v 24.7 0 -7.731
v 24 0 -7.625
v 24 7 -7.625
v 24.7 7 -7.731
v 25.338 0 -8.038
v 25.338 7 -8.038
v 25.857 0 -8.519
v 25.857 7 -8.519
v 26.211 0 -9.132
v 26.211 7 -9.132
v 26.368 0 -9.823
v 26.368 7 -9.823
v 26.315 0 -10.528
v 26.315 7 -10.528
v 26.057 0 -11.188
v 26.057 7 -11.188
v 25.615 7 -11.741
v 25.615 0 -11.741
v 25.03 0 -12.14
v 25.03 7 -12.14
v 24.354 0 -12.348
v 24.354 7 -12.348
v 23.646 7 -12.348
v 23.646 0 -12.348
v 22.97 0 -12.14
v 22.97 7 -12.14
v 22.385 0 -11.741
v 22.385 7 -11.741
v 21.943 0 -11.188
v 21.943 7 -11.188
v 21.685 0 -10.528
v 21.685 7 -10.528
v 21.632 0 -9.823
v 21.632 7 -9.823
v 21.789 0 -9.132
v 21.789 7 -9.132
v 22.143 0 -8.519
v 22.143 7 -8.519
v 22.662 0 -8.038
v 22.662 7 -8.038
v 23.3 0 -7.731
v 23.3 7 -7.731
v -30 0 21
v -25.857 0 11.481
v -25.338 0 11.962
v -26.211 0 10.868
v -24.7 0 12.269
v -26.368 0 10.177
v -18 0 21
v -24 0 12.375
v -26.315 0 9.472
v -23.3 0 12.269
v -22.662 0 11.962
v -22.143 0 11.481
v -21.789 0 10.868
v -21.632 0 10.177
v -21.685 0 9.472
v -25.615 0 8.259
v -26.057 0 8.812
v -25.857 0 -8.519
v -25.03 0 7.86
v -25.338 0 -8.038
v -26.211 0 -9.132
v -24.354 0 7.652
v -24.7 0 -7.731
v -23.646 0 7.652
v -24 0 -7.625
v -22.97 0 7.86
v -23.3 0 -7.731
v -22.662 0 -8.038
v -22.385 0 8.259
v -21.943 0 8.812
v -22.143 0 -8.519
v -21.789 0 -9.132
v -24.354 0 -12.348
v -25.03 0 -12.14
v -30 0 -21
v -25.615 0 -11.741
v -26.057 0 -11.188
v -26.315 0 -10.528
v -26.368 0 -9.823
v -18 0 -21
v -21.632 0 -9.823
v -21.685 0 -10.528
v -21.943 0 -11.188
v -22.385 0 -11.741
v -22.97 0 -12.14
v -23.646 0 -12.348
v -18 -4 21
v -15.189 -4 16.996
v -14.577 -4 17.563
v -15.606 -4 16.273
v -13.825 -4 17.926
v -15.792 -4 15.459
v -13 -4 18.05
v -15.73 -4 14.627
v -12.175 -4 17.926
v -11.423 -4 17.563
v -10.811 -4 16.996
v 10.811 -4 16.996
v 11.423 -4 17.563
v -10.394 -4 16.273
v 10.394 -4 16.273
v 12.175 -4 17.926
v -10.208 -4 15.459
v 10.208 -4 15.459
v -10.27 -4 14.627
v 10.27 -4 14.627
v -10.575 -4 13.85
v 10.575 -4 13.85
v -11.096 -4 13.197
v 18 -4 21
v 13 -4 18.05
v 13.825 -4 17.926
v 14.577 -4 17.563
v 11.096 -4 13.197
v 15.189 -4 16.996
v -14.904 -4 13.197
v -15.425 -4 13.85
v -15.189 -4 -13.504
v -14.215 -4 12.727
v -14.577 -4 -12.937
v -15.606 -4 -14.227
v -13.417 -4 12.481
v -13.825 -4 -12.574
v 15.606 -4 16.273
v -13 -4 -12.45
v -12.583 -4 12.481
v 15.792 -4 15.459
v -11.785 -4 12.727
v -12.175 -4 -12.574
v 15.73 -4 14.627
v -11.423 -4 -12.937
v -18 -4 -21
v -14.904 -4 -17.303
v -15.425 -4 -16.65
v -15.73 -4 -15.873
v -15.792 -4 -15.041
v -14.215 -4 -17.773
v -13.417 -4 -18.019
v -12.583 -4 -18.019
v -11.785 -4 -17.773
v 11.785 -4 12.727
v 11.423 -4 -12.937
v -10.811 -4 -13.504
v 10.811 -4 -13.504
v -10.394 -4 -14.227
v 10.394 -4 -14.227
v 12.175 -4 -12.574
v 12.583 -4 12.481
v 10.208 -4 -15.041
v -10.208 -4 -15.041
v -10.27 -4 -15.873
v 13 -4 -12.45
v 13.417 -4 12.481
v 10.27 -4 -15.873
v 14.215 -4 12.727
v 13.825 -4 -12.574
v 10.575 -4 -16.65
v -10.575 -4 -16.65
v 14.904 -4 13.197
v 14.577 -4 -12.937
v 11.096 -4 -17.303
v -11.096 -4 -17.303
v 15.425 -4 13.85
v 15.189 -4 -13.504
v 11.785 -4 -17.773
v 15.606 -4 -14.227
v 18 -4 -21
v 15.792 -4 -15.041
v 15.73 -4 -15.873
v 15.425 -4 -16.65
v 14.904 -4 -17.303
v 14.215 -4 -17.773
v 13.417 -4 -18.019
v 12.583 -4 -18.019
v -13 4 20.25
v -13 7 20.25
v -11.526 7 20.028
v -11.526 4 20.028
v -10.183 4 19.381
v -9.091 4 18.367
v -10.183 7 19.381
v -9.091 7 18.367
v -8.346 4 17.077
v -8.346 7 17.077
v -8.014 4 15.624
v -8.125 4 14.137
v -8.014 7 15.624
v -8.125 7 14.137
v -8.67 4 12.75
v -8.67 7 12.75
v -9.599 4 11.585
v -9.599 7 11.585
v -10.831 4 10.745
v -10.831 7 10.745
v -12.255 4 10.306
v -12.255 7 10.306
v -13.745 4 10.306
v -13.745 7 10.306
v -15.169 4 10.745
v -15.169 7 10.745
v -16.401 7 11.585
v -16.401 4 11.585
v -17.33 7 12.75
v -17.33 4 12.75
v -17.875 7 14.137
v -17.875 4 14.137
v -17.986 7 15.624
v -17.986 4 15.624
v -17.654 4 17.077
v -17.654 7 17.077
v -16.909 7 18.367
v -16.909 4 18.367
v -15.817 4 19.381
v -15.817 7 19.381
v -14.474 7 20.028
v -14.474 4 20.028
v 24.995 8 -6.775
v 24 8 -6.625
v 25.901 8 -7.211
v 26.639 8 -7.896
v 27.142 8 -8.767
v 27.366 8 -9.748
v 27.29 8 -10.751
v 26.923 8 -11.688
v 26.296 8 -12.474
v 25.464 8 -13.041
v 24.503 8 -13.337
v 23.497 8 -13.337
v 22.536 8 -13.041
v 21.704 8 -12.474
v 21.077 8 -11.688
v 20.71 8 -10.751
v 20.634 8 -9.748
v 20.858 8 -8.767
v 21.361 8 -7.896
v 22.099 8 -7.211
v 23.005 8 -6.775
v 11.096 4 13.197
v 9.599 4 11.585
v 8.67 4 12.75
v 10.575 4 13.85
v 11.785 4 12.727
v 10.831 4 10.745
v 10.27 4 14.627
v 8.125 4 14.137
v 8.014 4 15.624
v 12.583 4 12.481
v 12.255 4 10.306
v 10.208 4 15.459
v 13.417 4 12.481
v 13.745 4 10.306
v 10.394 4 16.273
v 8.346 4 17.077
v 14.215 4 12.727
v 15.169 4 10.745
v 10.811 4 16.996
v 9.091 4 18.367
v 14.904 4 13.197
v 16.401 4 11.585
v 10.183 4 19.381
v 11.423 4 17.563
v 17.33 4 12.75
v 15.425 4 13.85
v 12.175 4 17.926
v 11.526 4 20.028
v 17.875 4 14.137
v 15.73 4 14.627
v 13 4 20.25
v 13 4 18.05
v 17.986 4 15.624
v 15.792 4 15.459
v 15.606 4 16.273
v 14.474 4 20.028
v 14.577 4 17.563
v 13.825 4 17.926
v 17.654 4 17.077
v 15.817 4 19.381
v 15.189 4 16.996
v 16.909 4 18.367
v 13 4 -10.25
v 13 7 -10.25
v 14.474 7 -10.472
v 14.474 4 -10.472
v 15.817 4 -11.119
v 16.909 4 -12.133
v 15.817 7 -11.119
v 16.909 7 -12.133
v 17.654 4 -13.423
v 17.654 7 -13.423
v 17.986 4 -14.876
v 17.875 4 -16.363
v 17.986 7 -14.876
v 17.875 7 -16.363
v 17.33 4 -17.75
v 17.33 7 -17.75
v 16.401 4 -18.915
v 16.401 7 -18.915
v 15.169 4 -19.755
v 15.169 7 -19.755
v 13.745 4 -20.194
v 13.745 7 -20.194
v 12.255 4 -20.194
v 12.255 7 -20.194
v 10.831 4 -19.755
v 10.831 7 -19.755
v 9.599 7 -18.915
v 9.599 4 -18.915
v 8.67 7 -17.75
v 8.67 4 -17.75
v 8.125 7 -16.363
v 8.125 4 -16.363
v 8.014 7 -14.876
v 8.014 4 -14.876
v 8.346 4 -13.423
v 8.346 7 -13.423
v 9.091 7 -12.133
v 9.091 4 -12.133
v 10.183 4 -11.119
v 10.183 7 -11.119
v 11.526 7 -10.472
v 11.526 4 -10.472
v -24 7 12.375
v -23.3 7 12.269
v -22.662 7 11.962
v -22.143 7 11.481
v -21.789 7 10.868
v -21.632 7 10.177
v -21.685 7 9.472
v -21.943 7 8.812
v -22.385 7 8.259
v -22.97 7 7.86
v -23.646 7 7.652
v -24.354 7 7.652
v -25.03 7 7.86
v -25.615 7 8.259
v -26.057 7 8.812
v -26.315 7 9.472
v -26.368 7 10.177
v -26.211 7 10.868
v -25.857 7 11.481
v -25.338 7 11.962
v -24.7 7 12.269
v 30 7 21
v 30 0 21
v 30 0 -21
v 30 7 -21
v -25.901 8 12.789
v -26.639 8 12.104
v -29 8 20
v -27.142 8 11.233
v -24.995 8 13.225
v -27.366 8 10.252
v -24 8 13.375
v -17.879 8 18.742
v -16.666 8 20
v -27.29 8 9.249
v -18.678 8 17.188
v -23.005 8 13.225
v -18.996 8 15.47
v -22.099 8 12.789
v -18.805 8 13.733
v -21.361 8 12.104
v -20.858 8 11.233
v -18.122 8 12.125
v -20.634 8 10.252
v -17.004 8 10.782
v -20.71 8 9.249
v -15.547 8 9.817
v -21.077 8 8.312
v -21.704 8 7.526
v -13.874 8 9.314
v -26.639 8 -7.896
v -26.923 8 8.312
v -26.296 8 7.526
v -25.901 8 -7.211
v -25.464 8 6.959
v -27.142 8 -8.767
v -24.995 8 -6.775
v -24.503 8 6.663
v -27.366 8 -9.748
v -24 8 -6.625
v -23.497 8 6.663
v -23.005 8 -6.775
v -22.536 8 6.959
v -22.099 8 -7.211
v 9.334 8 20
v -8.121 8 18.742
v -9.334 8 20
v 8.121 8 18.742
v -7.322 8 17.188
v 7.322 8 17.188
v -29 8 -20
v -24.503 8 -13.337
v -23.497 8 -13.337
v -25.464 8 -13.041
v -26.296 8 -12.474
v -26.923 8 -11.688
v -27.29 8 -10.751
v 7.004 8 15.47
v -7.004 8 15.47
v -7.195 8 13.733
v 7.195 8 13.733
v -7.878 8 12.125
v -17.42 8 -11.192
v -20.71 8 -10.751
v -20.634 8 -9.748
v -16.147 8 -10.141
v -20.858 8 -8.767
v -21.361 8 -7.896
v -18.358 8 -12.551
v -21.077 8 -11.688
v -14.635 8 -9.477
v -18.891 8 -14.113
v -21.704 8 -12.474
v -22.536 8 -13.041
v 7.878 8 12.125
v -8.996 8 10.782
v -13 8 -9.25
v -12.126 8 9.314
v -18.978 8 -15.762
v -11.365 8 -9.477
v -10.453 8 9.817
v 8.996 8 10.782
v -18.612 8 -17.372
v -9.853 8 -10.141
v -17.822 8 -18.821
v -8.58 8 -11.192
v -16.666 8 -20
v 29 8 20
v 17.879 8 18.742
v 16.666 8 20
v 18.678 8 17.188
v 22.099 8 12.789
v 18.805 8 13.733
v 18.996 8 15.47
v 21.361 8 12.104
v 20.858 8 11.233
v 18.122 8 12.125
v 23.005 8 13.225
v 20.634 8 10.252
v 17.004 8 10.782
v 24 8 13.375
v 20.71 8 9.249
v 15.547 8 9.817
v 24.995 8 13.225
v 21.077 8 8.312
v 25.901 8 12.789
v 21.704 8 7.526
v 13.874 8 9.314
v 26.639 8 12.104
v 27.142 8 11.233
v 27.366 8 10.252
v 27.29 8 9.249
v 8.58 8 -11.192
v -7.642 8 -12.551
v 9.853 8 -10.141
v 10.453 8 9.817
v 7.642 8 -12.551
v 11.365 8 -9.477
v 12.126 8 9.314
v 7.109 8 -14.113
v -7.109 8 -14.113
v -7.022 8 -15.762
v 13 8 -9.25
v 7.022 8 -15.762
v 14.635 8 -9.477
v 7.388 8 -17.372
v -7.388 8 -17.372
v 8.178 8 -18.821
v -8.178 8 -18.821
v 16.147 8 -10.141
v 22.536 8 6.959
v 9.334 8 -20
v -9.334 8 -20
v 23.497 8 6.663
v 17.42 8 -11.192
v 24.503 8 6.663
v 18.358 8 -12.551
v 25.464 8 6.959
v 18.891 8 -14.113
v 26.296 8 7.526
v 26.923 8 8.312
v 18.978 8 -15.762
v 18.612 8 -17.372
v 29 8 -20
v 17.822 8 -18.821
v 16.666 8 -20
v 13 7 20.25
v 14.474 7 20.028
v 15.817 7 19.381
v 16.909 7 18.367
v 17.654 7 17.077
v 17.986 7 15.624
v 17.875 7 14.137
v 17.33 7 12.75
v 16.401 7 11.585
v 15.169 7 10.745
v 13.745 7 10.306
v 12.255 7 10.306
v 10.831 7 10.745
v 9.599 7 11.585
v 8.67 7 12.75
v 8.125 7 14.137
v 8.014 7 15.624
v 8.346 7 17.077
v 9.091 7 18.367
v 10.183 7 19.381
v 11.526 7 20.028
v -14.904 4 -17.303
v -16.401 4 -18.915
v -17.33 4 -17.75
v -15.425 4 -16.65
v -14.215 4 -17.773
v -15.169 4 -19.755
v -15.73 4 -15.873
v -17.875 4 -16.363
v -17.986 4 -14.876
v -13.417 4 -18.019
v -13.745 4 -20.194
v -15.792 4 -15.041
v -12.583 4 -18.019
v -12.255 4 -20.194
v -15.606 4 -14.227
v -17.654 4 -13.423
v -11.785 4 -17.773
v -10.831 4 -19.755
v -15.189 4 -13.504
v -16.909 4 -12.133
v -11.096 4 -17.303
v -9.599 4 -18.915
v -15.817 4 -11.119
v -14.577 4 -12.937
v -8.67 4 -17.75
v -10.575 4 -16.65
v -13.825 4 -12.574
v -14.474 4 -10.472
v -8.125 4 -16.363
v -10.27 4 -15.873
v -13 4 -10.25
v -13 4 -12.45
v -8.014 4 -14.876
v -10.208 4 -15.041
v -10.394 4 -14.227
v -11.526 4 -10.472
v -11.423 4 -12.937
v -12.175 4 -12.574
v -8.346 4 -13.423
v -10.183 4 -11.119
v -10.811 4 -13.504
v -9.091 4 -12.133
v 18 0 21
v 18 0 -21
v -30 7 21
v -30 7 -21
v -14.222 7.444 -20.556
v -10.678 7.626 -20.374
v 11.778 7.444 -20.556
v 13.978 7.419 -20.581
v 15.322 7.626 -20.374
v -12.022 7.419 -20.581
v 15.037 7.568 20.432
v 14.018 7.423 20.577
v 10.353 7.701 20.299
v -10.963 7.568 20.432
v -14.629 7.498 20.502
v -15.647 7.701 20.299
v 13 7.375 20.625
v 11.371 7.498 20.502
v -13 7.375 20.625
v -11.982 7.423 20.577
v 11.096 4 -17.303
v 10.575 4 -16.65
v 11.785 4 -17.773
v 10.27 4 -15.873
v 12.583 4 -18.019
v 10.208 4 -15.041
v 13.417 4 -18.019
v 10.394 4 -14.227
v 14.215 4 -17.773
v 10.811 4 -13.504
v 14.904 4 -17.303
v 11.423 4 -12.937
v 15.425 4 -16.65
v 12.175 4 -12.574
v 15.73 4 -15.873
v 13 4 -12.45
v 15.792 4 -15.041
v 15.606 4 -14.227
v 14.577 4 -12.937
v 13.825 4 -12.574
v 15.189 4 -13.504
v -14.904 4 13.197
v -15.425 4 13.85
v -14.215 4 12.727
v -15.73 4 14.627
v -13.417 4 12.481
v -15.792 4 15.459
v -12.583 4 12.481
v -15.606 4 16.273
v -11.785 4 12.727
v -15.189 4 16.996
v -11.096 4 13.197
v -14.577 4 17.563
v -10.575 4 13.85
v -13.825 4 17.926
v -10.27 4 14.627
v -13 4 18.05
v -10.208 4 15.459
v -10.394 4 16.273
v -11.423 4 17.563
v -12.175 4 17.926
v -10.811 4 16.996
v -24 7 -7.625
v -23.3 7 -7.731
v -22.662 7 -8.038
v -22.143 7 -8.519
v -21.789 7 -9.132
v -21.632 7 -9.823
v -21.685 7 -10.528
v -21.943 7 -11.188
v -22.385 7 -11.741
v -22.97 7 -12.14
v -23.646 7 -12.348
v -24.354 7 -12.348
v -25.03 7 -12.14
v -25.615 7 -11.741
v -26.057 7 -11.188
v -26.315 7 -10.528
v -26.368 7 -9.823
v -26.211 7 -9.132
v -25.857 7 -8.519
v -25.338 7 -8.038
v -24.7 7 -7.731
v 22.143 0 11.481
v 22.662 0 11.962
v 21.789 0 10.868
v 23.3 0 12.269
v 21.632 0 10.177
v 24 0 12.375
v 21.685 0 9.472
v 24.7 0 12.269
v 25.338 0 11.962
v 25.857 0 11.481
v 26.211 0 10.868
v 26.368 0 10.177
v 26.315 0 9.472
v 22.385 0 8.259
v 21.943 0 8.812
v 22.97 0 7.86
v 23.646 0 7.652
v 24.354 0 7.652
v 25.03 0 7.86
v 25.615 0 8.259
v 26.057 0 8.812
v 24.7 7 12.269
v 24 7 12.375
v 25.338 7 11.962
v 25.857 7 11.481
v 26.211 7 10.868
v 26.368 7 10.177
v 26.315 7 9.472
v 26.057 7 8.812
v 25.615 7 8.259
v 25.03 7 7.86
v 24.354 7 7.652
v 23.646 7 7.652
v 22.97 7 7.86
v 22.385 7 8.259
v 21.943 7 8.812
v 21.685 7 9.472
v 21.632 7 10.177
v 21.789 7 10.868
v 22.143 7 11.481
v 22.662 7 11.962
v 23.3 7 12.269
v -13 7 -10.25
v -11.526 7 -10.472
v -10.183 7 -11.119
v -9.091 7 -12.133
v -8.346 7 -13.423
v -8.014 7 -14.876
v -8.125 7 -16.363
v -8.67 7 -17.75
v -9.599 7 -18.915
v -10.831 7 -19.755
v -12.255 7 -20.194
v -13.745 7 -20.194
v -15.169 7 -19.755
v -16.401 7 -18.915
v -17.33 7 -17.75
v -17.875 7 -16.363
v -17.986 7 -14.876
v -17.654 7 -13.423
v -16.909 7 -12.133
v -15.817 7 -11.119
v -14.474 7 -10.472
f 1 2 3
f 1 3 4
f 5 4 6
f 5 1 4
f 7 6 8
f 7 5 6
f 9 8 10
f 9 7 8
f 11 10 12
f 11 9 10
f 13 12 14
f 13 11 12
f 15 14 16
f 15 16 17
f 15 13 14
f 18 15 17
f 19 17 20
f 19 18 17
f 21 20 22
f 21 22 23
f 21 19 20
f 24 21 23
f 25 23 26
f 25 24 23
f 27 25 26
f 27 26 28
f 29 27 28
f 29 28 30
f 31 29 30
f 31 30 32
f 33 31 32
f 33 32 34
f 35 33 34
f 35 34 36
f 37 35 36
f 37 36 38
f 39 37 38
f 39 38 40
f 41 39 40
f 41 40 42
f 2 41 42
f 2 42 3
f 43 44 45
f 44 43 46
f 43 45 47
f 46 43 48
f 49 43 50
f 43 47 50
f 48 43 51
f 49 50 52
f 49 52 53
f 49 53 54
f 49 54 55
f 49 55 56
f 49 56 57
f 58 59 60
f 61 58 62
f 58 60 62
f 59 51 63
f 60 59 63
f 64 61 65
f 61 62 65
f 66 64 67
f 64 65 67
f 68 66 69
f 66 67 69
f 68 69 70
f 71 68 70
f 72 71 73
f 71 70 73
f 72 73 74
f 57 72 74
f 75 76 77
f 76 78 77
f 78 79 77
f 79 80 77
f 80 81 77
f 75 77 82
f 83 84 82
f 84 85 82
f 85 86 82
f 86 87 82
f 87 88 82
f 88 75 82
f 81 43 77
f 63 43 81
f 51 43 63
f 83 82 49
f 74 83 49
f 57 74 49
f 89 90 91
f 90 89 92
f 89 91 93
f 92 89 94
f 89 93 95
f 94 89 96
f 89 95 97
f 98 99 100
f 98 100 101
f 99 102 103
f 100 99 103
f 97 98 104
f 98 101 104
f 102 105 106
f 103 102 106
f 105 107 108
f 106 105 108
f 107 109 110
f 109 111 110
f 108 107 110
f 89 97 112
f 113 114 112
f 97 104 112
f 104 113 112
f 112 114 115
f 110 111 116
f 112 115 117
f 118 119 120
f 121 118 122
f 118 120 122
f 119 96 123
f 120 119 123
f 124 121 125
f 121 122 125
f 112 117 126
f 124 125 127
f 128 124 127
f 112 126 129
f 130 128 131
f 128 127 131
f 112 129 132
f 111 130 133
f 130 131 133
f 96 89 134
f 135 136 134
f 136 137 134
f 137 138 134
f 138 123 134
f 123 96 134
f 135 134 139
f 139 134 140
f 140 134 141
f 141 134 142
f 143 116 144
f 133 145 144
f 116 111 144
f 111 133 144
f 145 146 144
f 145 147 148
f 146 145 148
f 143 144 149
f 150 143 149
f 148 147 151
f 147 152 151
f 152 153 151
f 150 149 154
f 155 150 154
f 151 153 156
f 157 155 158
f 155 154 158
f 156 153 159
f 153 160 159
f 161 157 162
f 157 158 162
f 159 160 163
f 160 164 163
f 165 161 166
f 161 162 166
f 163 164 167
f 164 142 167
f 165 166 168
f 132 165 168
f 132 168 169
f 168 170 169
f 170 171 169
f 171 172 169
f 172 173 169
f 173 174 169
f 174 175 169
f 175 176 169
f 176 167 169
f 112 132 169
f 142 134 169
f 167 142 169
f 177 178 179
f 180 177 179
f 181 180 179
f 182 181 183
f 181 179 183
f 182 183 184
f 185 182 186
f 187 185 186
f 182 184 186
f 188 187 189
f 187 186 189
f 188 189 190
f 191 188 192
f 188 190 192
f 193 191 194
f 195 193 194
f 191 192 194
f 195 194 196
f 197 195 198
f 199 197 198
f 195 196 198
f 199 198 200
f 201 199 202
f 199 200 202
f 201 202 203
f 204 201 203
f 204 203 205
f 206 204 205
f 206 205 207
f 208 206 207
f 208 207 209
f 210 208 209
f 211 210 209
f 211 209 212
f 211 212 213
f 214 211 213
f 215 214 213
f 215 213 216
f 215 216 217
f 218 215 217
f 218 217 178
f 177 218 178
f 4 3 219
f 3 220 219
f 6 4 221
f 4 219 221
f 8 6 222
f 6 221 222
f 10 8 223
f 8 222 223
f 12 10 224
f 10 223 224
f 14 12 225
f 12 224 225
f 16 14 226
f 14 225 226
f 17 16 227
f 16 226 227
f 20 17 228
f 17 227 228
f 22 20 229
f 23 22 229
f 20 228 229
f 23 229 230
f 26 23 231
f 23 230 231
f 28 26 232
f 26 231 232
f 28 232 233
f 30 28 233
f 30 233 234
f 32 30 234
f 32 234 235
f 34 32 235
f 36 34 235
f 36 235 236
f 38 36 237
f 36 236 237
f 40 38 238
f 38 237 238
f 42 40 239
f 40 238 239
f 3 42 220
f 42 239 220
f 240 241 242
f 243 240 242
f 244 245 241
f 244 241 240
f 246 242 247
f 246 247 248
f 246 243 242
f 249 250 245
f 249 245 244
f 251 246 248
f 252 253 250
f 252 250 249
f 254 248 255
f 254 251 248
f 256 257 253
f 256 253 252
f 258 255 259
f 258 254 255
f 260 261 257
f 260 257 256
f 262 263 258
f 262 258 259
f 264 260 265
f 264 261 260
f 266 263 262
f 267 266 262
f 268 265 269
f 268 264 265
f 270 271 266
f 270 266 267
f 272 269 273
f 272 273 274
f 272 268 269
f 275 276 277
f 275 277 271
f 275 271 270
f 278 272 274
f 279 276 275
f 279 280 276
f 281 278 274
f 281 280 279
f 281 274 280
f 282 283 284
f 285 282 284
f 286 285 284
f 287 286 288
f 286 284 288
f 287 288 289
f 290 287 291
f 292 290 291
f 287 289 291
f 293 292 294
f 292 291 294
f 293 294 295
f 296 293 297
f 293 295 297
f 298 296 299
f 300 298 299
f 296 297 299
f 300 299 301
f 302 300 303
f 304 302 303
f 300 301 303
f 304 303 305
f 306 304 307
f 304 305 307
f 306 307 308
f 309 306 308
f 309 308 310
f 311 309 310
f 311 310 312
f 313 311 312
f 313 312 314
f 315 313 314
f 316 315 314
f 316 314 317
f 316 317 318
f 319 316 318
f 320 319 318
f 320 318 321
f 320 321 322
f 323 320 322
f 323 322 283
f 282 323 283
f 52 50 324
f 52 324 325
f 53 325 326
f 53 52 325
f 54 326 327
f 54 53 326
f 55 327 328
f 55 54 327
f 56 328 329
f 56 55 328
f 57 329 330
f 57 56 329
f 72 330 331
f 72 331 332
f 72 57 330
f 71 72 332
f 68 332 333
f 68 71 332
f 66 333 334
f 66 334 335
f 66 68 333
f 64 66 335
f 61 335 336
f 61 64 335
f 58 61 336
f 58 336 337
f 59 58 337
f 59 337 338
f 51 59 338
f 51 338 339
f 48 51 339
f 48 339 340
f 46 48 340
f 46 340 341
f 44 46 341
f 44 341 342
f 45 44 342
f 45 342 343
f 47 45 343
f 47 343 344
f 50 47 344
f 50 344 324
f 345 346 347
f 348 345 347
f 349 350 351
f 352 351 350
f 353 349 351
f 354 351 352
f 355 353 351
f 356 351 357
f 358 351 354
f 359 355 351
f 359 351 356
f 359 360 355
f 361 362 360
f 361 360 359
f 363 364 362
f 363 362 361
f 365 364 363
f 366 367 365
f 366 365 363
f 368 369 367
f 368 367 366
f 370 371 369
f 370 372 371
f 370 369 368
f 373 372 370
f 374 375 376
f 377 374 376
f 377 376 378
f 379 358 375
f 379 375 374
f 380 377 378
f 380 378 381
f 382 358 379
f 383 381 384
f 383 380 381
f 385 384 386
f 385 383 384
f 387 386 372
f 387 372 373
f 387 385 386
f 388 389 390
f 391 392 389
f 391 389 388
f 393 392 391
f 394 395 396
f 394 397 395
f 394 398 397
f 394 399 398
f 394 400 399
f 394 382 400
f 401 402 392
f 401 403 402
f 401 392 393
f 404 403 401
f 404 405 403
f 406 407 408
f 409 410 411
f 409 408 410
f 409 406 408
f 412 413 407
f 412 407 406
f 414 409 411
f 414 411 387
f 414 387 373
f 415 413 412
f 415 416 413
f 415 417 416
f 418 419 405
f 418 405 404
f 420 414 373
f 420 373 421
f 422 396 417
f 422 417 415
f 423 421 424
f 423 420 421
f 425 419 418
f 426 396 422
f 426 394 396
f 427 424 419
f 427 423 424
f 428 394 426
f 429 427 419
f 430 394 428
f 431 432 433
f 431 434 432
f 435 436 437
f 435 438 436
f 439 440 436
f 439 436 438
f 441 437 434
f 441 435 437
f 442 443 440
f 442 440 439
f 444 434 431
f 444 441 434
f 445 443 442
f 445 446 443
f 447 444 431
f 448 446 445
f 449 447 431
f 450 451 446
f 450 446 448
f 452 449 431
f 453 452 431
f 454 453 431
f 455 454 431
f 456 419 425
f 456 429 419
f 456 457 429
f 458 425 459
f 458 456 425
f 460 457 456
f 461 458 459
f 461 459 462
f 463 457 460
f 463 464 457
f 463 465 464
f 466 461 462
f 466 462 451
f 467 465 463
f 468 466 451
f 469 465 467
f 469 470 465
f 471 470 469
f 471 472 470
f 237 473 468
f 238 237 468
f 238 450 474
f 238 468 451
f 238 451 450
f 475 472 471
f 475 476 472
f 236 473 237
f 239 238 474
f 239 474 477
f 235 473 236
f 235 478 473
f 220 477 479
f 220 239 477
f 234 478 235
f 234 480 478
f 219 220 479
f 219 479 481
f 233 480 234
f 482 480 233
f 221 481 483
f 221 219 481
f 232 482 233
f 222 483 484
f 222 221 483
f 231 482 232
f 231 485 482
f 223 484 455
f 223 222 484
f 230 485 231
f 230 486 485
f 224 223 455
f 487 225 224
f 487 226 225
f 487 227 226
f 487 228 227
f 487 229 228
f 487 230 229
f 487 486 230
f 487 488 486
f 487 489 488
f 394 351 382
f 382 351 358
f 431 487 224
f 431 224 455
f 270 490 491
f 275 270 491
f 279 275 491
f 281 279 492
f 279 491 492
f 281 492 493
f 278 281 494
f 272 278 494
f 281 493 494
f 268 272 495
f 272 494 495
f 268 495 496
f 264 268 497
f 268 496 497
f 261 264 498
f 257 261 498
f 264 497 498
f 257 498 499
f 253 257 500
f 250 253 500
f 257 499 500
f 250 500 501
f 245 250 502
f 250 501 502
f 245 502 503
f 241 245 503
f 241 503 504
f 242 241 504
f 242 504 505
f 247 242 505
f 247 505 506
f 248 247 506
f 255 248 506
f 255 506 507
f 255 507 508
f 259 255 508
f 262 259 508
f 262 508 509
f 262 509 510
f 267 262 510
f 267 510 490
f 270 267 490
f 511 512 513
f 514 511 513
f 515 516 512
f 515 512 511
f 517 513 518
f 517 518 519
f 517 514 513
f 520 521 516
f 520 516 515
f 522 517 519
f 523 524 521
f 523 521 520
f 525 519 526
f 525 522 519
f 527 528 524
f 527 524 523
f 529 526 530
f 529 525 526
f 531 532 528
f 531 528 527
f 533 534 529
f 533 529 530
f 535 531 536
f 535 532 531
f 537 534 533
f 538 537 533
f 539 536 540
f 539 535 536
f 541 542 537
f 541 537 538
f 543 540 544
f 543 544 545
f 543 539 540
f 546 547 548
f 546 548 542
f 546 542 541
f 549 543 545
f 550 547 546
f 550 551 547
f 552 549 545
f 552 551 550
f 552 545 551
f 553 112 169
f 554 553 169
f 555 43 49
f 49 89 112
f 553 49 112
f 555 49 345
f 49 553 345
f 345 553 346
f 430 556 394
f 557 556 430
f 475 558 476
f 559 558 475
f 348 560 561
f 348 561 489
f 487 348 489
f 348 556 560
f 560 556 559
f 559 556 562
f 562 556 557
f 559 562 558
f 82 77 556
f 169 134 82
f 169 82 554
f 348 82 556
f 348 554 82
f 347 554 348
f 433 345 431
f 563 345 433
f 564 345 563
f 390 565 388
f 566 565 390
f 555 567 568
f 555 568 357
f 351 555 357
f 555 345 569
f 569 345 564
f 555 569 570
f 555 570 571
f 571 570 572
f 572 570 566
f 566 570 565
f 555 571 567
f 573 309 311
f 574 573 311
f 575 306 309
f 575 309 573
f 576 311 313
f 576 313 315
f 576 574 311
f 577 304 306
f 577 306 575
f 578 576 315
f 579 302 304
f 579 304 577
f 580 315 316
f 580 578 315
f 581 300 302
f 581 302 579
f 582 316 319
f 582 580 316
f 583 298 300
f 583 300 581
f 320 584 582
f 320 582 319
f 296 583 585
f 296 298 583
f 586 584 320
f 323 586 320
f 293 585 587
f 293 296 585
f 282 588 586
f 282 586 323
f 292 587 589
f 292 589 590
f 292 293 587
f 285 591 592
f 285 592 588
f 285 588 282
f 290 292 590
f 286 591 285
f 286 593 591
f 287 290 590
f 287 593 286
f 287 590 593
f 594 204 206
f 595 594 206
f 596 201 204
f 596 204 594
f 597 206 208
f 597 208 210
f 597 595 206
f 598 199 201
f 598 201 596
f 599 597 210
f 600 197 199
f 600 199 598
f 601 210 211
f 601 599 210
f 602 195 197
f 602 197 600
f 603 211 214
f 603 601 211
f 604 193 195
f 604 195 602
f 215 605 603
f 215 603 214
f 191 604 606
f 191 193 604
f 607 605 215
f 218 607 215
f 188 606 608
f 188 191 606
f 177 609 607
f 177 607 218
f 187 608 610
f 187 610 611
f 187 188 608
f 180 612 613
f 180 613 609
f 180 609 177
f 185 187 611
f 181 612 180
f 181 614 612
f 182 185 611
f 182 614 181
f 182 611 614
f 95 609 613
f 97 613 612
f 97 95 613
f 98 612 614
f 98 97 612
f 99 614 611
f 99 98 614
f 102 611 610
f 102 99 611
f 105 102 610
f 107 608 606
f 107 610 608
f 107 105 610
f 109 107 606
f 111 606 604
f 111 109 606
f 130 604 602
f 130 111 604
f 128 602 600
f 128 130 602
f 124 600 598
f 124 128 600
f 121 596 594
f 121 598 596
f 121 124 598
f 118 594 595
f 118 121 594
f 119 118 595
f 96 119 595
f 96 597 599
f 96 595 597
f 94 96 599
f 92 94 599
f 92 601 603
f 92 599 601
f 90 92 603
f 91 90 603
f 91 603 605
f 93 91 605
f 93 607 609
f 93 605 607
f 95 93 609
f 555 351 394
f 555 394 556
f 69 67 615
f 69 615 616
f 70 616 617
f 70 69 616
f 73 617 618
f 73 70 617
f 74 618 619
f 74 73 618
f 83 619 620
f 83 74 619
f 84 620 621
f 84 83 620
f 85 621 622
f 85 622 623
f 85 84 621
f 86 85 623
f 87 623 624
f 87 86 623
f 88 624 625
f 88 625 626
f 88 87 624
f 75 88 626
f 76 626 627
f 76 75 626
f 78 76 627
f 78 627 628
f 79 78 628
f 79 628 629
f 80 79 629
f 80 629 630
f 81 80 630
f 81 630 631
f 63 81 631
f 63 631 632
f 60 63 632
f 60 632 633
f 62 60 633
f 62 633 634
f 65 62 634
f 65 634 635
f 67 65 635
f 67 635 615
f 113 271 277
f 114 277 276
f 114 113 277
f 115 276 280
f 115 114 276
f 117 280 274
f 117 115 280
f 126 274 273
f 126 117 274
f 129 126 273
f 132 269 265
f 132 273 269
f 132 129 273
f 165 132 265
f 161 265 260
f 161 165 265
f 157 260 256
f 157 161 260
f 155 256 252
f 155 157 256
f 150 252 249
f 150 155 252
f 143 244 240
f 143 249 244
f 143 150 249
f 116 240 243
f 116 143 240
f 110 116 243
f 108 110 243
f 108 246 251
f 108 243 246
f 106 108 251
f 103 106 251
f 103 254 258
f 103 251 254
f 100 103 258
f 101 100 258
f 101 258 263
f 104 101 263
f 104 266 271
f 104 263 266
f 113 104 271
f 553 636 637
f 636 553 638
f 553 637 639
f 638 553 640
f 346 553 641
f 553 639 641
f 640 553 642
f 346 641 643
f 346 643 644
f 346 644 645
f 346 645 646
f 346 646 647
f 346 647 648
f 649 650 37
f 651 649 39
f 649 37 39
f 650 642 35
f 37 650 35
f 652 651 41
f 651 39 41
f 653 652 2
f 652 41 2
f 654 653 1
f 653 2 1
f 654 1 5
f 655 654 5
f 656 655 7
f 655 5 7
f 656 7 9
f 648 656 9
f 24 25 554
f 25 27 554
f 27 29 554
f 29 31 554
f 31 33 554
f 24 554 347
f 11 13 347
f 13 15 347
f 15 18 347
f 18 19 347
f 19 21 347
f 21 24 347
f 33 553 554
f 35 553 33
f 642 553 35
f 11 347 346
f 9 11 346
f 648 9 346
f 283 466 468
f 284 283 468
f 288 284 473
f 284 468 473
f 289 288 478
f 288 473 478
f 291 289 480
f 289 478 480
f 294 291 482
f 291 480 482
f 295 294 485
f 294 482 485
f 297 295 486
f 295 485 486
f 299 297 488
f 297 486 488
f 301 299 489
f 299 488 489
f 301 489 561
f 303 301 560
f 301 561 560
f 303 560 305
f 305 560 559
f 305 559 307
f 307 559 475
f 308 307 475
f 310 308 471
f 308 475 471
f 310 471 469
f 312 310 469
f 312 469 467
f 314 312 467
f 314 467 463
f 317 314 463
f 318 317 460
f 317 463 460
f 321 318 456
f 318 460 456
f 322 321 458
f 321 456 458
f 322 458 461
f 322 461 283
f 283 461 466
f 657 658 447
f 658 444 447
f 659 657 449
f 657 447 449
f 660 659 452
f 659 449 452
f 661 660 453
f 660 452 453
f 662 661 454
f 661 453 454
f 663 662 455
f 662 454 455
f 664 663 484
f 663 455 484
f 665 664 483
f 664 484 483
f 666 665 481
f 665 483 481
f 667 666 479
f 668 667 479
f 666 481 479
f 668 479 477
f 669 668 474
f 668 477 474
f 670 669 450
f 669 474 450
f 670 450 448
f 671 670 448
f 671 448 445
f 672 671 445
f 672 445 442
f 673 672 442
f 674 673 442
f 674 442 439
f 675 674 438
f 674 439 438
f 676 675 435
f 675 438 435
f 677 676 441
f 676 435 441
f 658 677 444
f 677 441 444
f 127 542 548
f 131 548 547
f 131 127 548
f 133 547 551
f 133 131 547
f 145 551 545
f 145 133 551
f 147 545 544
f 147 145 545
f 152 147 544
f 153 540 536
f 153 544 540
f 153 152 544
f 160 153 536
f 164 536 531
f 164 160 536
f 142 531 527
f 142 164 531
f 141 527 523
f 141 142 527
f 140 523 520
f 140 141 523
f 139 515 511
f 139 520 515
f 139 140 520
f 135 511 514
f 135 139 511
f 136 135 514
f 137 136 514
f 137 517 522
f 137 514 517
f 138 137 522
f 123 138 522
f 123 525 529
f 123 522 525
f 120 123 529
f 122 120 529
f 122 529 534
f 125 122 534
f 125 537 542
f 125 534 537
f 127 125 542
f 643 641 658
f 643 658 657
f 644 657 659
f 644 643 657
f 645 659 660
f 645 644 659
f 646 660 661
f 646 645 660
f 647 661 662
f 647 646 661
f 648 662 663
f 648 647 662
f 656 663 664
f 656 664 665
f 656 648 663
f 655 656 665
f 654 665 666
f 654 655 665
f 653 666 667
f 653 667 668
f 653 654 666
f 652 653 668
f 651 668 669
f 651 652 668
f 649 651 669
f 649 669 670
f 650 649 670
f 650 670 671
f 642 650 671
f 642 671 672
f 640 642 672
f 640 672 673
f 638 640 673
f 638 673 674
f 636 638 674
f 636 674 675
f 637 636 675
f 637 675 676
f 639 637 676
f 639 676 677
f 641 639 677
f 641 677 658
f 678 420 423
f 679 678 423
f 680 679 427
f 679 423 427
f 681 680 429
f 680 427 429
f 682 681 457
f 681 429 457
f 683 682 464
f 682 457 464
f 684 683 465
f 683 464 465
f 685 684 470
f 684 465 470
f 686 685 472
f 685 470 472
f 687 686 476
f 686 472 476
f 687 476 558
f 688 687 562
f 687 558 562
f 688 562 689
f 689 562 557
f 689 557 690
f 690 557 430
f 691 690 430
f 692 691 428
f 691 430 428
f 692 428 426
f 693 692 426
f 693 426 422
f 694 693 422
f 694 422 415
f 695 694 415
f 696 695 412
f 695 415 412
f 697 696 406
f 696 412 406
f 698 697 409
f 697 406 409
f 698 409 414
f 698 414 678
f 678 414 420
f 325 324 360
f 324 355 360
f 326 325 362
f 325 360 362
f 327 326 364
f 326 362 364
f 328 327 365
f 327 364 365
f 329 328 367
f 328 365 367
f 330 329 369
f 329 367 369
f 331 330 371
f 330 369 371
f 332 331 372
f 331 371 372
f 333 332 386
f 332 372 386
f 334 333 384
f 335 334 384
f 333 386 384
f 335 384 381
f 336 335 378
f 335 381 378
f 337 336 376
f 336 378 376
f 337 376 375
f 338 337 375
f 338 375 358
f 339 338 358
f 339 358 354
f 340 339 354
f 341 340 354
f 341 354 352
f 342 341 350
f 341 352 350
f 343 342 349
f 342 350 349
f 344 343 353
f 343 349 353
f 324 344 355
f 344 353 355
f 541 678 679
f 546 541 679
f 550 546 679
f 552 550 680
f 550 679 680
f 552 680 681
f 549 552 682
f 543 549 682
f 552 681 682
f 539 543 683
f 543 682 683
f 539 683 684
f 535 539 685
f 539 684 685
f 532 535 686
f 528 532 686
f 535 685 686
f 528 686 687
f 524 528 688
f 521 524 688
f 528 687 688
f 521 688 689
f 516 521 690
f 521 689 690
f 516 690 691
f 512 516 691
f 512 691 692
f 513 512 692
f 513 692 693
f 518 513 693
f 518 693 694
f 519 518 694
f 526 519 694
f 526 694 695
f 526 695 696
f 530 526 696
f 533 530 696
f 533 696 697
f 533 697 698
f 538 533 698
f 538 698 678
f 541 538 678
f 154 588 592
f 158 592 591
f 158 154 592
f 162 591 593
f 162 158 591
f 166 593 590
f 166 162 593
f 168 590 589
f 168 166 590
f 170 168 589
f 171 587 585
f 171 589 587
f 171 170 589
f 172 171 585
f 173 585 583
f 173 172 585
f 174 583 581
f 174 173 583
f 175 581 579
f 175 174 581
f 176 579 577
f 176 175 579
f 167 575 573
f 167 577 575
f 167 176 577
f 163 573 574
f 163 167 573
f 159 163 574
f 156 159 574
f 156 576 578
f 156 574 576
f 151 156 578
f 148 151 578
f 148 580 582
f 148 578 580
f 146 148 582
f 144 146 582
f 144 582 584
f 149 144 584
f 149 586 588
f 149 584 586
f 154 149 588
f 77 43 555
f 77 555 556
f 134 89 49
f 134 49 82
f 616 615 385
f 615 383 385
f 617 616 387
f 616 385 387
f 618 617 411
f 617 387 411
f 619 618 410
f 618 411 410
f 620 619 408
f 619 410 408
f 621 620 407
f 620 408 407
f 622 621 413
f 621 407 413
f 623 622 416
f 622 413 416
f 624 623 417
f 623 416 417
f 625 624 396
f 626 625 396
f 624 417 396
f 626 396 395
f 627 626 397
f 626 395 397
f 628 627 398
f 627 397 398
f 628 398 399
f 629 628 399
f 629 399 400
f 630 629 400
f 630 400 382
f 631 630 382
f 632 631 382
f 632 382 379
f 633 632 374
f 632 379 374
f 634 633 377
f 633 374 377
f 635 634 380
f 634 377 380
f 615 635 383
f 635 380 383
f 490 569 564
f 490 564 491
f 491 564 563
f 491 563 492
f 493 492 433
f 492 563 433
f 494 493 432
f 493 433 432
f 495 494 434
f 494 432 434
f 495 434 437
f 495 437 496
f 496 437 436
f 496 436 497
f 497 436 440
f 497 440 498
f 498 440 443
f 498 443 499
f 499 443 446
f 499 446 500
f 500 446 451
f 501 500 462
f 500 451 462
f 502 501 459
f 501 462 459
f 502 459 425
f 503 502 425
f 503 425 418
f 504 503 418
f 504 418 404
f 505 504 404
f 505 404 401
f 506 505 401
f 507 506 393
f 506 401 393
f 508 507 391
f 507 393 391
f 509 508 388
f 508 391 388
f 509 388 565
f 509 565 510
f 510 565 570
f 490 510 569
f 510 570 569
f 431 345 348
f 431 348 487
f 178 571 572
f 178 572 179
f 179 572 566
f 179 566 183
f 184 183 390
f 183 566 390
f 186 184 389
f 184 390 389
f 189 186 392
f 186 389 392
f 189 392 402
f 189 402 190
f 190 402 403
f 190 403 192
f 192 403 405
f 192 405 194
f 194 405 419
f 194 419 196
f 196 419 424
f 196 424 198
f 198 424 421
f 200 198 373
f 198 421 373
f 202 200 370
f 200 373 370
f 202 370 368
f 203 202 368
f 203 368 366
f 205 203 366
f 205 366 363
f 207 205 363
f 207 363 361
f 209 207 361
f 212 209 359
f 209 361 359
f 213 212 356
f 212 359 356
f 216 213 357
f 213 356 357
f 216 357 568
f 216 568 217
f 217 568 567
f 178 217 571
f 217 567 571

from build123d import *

# Parameters (mm, degrees)
ESBO_O1_W                = 60
ESBO_O1_H                = 42
ESBO_O1_R                = 2.8
ESBO_O1_R_2              = 2.375
RESSALTO_EXTRUS_O1_DEPTH = 8
CORTE_EXTRUS_O1_START    = 8
ESBO_O1_3_R              = 5
CORTE_EXTRUS_O1_DEPTH    = 4
RESSALTO_EXTRUS_O4_START = -4
ESBO_O1_5_W              = 36
ESBO_O1_5_H              = 42
ESBO_O1_5_R              = 2.8
RESSALTO_EXTRUS_O4_DEPTH = 4
CHANFRO1_SIZE            = 1


with BuildPart() as part:
    # Esboço1 → Ressalto-extrusão1 (new body)
    with BuildSketch(Plane(origin=(0, 0, 0), x_dir=(1, 0, 0), z_dir=(0, 1, 0))):
        Rectangle(ESBO_O1_W, ESBO_O1_H)
        with Locations(Location((-13, 15.25, 0), (0, 0, 270))):
            Circle(ESBO_O1_R, mode=Mode.SUBTRACT)
        with Locations(Location((-13, -15.25, 0), (0, 0, 270))):
            Circle(ESBO_O1_R, mode=Mode.SUBTRACT)
        with Locations(Location((13, 15.25, 0), (0, 0, 270))):
            Circle(ESBO_O1_R, mode=Mode.SUBTRACT)
        with Locations(Location((13, -15.25, 0), (0, 0, 270))):
            Circle(ESBO_O1_R, mode=Mode.SUBTRACT)
        with Locations(Location((-24, 10, 0), (0, 0, 270))):
            Circle(ESBO_O1_R_2, mode=Mode.SUBTRACT)
        with Locations(Location((-24, -10, 0), (0, 0, 270))):
            Circle(ESBO_O1_R_2, mode=Mode.SUBTRACT)
        with Locations(Location((24, -10, 0), (0, 0, 270))):
            Circle(ESBO_O1_R_2, mode=Mode.SUBTRACT)
        with Locations(Location((24, 10, 0), (0, 0, 270))):
            Circle(ESBO_O1_R_2, mode=Mode.SUBTRACT)
    extrude(amount=RESSALTO_EXTRUS_O1_DEPTH)

    # Esboço1<3> → Corte-extrusão1 (cut)
    with BuildSketch(Plane(origin=(0, 0, 0), x_dir=(1, 0, 0), z_dir=(0, 1, 0)).offset(CORTE_EXTRUS_O1_START)):
        with Locations(Location((-13, 15.25, 0), (0, 0, 270))):
            Circle(ESBO_O1_3_R)
        with Locations(Location((13, 15.25, 0), (0, 0, 270))):
            Circle(ESBO_O1_3_R)
        with Locations(Location((13, -15.25, 0), (0, 0, 270))):
            Circle(ESBO_O1_3_R)
        with Locations(Location((-13, -15.25, 0), (0, 0, 270))):
            Circle(ESBO_O1_3_R)
    extrude(amount=-CORTE_EXTRUS_O1_DEPTH, mode=Mode.SUBTRACT)

    # Esboço1<5> → Ressalto-extrusão4 (add)
    with BuildSketch(Plane(origin=(0, 0, 0), x_dir=(1, 0, 0), z_dir=(0, 1, 0)).offset(RESSALTO_EXTRUS_O4_START)):
        Rectangle(ESBO_O1_5_W, ESBO_O1_5_H)
        with Locations(Location((13, -15.25, 0), (0, 0, 270))):
            Circle(ESBO_O1_5_R, mode=Mode.SUBTRACT)
        with Locations(Location((-13, -15.25, 0), (0, 0, 270))):
            Circle(ESBO_O1_5_R, mode=Mode.SUBTRACT)
        with Locations(Location((13, 15.25, 0), (0, 0, 270))):
            Circle(ESBO_O1_5_R, mode=Mode.SUBTRACT)
        with Locations(Location((-13, 15.25, 0), (0, 0, 270))):
            Circle(ESBO_O1_5_R, mode=Mode.SUBTRACT)
    extrude(amount=RESSALTO_EXTRUS_O4_DEPTH)

    # Chanfro1
    # the kernel refuses this chamfer: 1 mm, written as the material it takes off along each edge
    with BuildSketch(Plane(origin=(-30, 8, -23.571682988), x_dir=(0.9996219169112968, 0.027495876610585647, 0), z_dir=(0, 0, 1))) as chanfro1_piece_1:
        Polygon((CHANFRO1_SIZE * 0.999621916911, -CHANFRO1_SIZE * 0.0274958766106), (-CHANFRO1_SIZE * 0.0274958766106, -CHANFRO1_SIZE * 0.999621916911), (0, 0), align=None)
    extrude(amount=47.143365976, mode=Mode.SUBTRACT)
    with BuildSketch(Plane(origin=(-32.571682988, 8, 21), x_dir=(0, -0.9996219169112968, 0.027495876610585623), z_dir=(1, 0, 0)), Plane(origin=(32.571682988, 8, -21), x_dir=(0, -0.9996219169112968, -0.027495876610585623), z_dir=(-1, 0, 0))) as chanfro1_piece_2:
        Polygon((CHANFRO1_SIZE * 0.999621916911, CHANFRO1_SIZE * 0.0274958766106), (-CHANFRO1_SIZE * 0.0274958766106, CHANFRO1_SIZE * 0.999621916911), (0, 0), align=None)
    extrude(amount=65.143365976, mode=Mode.SUBTRACT)
    with BuildSketch(Plane(origin=(30, 8, 23.571682988), x_dir=(0.027495876610585623, -0.9996219169112968, 0), z_dir=(0, 0, -1))) as chanfro1_piece_3:
        Polygon((CHANFRO1_SIZE * 0.999621916911, CHANFRO1_SIZE * 0.0274958766106), (-CHANFRO1_SIZE * 0.0274958766106, CHANFRO1_SIZE * 0.999621916911), (0, 0), align=None)
    extrude(amount=47.143365976, mode=Mode.SUBTRACT)
    with BuildSketch(Plane(origin=(-24, 8, 10), x_dir=(0, 0, 1), z_dir=(-1, 0, 0))) as chanfro1_piece_4:
        Polygon((2.375, -CHANFRO1_SIZE), (2.375 + CHANFRO1_SIZE, 0), (2.375, 0), align=None)
    revolve(axis=Axis((-24, 8, 10), (0, 1, 0)), mode=Mode.SUBTRACT)
    with BuildSketch(Plane(origin=(-24, 8, -10), x_dir=(0, 0, 1), z_dir=(-1, 0, 0))) as chanfro1_piece_5:
        Polygon((2.375, -CHANFRO1_SIZE), (2.375 + CHANFRO1_SIZE, 0), (2.375, 0), align=None)
    revolve(axis=Axis((-24, 8, -10), (0, 1, 0)), mode=Mode.SUBTRACT)
    with BuildSketch(Plane(origin=(-13, 8, -15.25), x_dir=(0, 0, 1), z_dir=(-1, 0, 0))) as chanfro1_piece_6:
        Polygon((5, -CHANFRO1_SIZE), (5 + CHANFRO1_SIZE, 0), (5, 0), align=None)
    revolve(axis=Axis((-13, 8, -15.25), (0, 1, 0)), mode=Mode.SUBTRACT)
    with BuildSketch(Plane(origin=(24, 8, -10), x_dir=(0, 0, 1), z_dir=(-1, 0, 0))) as chanfro1_piece_7:
        Polygon((2.375, -CHANFRO1_SIZE), (2.375 + CHANFRO1_SIZE, 0), (2.375, 0), align=None)
    revolve(axis=Axis((24, 8, -10), (0, 1, 0)), mode=Mode.SUBTRACT)
    with BuildSketch(Plane(origin=(24, 8, 10), x_dir=(0, 0, 1), z_dir=(-1, 0, 0))) as chanfro1_piece_8:
        Polygon((2.375, -CHANFRO1_SIZE), (2.375 + CHANFRO1_SIZE, 0), (2.375, 0), align=None)
    revolve(axis=Axis((24, 8, 10), (0, 1, 0)), mode=Mode.SUBTRACT)
    with BuildSketch(Plane(origin=(13, 8, -15.25), x_dir=(0, 0, 1), z_dir=(-1, 0, 0))) as chanfro1_piece_9:
        Polygon((5, -CHANFRO1_SIZE), (5 + CHANFRO1_SIZE, 0), (5, 0), align=None)
    revolve(axis=Axis((13, 8, -15.25), (0, 1, 0)), mode=Mode.SUBTRACT)
    with BuildSketch(Plane(origin=(-13, 8, 15.25), x_dir=(0, 0, 1), z_dir=(-1, 0, 0))) as chanfro1_piece_10:
        Polygon((5, -CHANFRO1_SIZE), (5 + CHANFRO1_SIZE, 0), (5, 0), align=None)
    revolve(axis=Axis((-13, 8, 15.25), (0, 1, 0)), mode=Mode.SUBTRACT)
    with BuildSketch(Plane(origin=(13, 8, 15.25), x_dir=(0, 0, 1), z_dir=(-1, 0, 0))) as chanfro1_piece_11:
        Polygon((5, -CHANFRO1_SIZE), (5 + CHANFRO1_SIZE, 0), (5, 0), align=None)
    revolve(axis=Axis((13, 8, 15.25), (0, 1, 0)), mode=Mode.SUBTRACT)


solid = part.part
